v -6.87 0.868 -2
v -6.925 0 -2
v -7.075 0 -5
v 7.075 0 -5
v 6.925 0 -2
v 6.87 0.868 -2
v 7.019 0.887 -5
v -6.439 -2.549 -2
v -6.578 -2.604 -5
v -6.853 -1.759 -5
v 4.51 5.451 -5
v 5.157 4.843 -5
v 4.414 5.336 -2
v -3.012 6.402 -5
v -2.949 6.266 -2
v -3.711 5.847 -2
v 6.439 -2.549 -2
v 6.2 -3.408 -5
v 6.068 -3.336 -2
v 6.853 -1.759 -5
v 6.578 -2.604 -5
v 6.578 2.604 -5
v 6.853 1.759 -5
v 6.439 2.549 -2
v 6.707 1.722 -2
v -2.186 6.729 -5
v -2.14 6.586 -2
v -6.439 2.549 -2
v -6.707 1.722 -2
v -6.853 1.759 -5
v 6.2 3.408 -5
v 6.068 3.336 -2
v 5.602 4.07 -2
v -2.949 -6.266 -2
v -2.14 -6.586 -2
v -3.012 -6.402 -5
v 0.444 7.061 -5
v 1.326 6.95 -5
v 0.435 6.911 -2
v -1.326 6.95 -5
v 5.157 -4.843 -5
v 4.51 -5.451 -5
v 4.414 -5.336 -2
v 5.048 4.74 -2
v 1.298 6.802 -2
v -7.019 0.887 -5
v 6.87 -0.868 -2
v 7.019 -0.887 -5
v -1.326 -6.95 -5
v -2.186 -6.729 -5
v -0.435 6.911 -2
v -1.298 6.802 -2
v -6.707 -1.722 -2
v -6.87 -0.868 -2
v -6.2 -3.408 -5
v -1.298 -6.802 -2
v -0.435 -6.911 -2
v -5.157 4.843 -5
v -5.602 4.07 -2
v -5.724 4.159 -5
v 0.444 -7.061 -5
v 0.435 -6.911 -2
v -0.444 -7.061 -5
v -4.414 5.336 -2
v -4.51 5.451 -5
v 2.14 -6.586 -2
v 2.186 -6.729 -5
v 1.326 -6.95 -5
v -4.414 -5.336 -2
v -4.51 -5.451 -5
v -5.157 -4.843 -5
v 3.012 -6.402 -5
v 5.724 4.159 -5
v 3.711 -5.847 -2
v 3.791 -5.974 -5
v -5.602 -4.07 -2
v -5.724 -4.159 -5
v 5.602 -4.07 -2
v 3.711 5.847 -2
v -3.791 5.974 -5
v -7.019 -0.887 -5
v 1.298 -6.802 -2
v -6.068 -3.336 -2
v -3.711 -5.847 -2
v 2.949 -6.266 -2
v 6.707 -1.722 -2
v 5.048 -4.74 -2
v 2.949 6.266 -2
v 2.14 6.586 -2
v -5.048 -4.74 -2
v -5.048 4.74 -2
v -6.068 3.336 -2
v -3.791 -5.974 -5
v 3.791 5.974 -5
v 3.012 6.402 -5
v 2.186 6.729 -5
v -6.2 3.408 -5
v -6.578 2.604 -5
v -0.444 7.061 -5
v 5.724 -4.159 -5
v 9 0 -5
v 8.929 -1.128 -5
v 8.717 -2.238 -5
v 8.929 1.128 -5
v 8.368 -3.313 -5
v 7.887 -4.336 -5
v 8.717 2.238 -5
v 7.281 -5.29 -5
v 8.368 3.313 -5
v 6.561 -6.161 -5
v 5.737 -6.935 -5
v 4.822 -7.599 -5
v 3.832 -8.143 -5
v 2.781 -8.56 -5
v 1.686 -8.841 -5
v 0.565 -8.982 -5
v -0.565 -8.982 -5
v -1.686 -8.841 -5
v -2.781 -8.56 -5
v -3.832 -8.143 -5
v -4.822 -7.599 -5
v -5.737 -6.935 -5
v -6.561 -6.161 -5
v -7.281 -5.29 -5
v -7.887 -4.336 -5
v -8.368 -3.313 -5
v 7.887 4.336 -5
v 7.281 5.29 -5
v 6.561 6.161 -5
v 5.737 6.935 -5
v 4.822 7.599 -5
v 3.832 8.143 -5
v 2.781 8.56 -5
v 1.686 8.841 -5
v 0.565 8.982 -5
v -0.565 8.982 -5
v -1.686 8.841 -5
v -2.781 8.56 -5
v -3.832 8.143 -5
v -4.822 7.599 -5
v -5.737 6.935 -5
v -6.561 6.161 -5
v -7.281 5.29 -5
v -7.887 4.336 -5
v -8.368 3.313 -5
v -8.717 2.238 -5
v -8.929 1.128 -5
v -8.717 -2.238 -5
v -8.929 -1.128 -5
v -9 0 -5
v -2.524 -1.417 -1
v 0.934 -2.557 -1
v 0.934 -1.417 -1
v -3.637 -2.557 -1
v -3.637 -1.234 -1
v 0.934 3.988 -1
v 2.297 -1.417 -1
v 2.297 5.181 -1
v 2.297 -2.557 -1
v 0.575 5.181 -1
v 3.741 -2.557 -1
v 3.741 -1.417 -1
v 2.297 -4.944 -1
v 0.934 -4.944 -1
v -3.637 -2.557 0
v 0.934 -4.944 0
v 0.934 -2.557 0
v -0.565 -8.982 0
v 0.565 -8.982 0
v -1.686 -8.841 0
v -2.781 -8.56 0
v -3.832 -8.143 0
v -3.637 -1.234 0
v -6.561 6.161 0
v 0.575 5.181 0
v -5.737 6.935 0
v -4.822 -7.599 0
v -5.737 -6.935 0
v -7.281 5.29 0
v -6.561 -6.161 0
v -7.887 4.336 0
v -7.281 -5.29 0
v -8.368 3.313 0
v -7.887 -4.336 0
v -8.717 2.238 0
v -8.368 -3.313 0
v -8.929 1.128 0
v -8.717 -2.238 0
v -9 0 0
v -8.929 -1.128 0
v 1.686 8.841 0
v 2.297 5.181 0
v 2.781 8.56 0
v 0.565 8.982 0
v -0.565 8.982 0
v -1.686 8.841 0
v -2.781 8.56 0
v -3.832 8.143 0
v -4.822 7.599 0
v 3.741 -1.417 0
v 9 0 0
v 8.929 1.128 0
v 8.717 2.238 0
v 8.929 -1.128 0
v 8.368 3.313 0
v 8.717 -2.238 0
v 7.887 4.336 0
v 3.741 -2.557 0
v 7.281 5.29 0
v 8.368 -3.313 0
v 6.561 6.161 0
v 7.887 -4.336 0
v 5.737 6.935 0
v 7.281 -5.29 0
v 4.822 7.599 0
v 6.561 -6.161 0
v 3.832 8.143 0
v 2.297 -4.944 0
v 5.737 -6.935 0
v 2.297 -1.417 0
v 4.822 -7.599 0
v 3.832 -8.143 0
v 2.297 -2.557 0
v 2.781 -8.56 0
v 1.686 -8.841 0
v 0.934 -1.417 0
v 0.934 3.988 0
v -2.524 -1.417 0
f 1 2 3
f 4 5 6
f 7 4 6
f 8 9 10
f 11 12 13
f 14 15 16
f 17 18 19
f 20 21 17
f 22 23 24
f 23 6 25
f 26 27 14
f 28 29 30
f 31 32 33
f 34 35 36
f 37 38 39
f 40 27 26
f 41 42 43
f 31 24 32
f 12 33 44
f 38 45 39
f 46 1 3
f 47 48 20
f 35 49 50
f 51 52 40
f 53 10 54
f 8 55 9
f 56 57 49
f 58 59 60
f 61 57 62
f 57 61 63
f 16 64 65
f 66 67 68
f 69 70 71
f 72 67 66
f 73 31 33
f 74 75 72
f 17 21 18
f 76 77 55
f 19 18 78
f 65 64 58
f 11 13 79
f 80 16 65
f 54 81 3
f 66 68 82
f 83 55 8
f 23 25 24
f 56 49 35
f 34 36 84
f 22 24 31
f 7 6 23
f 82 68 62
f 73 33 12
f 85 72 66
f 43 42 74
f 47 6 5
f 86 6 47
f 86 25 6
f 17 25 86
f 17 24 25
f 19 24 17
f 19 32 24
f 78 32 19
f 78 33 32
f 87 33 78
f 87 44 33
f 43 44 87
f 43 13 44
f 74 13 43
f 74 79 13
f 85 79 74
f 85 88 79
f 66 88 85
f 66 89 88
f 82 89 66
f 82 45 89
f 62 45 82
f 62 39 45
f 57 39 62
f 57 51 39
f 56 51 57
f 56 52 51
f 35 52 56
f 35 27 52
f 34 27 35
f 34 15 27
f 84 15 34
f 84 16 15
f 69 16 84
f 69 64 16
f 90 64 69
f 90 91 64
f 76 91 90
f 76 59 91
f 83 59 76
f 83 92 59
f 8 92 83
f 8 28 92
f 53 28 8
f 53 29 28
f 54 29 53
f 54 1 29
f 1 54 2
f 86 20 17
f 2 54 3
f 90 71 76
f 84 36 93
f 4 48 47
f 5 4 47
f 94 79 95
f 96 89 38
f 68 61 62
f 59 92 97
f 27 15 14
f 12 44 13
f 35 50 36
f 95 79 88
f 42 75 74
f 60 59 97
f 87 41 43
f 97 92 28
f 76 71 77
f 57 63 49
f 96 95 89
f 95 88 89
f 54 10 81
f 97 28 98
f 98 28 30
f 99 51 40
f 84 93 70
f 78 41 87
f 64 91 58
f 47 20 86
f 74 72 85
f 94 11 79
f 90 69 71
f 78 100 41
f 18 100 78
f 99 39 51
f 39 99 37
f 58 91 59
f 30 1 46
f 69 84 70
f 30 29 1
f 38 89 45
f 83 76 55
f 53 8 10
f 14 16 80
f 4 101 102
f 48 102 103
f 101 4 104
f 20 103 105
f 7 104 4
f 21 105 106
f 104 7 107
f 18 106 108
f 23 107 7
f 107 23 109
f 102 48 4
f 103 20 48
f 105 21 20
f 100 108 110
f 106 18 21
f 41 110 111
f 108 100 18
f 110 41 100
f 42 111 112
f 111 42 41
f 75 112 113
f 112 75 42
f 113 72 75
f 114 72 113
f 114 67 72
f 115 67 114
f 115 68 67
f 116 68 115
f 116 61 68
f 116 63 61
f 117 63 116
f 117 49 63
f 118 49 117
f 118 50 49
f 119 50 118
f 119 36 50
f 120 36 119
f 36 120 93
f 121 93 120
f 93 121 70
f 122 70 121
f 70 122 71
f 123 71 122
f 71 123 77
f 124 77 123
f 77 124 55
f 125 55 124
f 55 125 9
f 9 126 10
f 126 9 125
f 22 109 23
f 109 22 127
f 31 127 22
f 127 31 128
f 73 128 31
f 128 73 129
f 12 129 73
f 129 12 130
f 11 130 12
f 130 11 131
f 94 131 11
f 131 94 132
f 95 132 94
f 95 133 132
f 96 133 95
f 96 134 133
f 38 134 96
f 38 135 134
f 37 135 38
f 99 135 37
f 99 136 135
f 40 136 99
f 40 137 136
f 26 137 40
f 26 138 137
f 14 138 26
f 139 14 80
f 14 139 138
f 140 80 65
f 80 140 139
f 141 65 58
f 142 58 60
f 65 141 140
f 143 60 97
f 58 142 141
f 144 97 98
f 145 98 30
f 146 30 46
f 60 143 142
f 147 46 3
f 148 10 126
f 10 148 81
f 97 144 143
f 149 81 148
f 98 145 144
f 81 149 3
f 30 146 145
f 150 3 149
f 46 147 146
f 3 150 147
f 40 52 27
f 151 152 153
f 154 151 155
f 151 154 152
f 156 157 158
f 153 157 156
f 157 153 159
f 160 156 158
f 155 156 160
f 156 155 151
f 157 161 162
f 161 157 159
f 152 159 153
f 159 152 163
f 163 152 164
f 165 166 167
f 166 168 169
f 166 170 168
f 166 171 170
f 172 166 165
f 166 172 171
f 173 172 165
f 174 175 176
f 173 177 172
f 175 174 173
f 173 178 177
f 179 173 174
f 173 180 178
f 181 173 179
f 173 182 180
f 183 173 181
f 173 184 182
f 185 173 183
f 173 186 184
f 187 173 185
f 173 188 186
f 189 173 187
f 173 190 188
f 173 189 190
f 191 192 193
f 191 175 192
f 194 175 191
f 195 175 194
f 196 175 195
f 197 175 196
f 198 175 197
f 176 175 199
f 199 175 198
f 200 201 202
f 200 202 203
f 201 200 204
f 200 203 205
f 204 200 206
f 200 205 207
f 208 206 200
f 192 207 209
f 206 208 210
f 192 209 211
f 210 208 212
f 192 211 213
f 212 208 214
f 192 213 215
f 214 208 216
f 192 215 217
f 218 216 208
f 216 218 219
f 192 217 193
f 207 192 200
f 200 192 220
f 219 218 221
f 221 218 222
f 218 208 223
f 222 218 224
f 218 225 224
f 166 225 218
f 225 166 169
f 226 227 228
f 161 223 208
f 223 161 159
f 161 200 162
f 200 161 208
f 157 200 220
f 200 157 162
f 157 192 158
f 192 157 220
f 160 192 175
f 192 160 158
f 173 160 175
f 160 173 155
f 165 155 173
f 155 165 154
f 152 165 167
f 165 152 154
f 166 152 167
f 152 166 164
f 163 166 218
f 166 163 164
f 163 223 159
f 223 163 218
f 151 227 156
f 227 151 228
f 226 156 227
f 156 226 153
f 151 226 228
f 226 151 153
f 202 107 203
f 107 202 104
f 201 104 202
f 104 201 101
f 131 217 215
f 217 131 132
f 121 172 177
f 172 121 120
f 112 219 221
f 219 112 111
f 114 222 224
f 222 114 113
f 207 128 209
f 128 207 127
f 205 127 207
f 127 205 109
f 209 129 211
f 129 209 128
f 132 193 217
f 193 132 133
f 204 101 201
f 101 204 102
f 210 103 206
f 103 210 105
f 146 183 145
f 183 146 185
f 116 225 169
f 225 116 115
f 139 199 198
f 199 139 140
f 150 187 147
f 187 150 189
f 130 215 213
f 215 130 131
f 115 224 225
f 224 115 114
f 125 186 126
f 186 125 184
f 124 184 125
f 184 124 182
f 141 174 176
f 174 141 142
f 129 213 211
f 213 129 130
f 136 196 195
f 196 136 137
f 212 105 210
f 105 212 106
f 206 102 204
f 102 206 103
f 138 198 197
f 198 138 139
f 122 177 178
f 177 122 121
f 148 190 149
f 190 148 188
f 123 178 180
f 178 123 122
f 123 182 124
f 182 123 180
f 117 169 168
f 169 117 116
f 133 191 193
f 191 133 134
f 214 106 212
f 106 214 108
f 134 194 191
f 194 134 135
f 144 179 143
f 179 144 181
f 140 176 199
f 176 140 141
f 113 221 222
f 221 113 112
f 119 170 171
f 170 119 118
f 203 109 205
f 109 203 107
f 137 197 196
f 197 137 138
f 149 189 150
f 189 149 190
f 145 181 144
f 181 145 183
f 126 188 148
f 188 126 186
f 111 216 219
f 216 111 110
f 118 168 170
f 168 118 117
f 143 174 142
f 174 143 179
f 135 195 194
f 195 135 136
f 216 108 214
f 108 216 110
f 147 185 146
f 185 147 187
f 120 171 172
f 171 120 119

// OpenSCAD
$fn = 50;

difference() {
	union() {
		translate(v = [0, 0, -5.0]) {
			cylinder(h = 5, r = 9.0);
		}
	}
	union() {
		#translate(v = [0, 0, -5.0]) {
			cylinder(h = 3, r1 = 7.075, r2 = 6.925);
		}
		translate(v = [0, 0, -1]) {
			linear_extrude(height = 1) {
				text(font = "Impact", halign = "center", size = 10, text = "4", valign = "center");
			}
		}
	}
}
